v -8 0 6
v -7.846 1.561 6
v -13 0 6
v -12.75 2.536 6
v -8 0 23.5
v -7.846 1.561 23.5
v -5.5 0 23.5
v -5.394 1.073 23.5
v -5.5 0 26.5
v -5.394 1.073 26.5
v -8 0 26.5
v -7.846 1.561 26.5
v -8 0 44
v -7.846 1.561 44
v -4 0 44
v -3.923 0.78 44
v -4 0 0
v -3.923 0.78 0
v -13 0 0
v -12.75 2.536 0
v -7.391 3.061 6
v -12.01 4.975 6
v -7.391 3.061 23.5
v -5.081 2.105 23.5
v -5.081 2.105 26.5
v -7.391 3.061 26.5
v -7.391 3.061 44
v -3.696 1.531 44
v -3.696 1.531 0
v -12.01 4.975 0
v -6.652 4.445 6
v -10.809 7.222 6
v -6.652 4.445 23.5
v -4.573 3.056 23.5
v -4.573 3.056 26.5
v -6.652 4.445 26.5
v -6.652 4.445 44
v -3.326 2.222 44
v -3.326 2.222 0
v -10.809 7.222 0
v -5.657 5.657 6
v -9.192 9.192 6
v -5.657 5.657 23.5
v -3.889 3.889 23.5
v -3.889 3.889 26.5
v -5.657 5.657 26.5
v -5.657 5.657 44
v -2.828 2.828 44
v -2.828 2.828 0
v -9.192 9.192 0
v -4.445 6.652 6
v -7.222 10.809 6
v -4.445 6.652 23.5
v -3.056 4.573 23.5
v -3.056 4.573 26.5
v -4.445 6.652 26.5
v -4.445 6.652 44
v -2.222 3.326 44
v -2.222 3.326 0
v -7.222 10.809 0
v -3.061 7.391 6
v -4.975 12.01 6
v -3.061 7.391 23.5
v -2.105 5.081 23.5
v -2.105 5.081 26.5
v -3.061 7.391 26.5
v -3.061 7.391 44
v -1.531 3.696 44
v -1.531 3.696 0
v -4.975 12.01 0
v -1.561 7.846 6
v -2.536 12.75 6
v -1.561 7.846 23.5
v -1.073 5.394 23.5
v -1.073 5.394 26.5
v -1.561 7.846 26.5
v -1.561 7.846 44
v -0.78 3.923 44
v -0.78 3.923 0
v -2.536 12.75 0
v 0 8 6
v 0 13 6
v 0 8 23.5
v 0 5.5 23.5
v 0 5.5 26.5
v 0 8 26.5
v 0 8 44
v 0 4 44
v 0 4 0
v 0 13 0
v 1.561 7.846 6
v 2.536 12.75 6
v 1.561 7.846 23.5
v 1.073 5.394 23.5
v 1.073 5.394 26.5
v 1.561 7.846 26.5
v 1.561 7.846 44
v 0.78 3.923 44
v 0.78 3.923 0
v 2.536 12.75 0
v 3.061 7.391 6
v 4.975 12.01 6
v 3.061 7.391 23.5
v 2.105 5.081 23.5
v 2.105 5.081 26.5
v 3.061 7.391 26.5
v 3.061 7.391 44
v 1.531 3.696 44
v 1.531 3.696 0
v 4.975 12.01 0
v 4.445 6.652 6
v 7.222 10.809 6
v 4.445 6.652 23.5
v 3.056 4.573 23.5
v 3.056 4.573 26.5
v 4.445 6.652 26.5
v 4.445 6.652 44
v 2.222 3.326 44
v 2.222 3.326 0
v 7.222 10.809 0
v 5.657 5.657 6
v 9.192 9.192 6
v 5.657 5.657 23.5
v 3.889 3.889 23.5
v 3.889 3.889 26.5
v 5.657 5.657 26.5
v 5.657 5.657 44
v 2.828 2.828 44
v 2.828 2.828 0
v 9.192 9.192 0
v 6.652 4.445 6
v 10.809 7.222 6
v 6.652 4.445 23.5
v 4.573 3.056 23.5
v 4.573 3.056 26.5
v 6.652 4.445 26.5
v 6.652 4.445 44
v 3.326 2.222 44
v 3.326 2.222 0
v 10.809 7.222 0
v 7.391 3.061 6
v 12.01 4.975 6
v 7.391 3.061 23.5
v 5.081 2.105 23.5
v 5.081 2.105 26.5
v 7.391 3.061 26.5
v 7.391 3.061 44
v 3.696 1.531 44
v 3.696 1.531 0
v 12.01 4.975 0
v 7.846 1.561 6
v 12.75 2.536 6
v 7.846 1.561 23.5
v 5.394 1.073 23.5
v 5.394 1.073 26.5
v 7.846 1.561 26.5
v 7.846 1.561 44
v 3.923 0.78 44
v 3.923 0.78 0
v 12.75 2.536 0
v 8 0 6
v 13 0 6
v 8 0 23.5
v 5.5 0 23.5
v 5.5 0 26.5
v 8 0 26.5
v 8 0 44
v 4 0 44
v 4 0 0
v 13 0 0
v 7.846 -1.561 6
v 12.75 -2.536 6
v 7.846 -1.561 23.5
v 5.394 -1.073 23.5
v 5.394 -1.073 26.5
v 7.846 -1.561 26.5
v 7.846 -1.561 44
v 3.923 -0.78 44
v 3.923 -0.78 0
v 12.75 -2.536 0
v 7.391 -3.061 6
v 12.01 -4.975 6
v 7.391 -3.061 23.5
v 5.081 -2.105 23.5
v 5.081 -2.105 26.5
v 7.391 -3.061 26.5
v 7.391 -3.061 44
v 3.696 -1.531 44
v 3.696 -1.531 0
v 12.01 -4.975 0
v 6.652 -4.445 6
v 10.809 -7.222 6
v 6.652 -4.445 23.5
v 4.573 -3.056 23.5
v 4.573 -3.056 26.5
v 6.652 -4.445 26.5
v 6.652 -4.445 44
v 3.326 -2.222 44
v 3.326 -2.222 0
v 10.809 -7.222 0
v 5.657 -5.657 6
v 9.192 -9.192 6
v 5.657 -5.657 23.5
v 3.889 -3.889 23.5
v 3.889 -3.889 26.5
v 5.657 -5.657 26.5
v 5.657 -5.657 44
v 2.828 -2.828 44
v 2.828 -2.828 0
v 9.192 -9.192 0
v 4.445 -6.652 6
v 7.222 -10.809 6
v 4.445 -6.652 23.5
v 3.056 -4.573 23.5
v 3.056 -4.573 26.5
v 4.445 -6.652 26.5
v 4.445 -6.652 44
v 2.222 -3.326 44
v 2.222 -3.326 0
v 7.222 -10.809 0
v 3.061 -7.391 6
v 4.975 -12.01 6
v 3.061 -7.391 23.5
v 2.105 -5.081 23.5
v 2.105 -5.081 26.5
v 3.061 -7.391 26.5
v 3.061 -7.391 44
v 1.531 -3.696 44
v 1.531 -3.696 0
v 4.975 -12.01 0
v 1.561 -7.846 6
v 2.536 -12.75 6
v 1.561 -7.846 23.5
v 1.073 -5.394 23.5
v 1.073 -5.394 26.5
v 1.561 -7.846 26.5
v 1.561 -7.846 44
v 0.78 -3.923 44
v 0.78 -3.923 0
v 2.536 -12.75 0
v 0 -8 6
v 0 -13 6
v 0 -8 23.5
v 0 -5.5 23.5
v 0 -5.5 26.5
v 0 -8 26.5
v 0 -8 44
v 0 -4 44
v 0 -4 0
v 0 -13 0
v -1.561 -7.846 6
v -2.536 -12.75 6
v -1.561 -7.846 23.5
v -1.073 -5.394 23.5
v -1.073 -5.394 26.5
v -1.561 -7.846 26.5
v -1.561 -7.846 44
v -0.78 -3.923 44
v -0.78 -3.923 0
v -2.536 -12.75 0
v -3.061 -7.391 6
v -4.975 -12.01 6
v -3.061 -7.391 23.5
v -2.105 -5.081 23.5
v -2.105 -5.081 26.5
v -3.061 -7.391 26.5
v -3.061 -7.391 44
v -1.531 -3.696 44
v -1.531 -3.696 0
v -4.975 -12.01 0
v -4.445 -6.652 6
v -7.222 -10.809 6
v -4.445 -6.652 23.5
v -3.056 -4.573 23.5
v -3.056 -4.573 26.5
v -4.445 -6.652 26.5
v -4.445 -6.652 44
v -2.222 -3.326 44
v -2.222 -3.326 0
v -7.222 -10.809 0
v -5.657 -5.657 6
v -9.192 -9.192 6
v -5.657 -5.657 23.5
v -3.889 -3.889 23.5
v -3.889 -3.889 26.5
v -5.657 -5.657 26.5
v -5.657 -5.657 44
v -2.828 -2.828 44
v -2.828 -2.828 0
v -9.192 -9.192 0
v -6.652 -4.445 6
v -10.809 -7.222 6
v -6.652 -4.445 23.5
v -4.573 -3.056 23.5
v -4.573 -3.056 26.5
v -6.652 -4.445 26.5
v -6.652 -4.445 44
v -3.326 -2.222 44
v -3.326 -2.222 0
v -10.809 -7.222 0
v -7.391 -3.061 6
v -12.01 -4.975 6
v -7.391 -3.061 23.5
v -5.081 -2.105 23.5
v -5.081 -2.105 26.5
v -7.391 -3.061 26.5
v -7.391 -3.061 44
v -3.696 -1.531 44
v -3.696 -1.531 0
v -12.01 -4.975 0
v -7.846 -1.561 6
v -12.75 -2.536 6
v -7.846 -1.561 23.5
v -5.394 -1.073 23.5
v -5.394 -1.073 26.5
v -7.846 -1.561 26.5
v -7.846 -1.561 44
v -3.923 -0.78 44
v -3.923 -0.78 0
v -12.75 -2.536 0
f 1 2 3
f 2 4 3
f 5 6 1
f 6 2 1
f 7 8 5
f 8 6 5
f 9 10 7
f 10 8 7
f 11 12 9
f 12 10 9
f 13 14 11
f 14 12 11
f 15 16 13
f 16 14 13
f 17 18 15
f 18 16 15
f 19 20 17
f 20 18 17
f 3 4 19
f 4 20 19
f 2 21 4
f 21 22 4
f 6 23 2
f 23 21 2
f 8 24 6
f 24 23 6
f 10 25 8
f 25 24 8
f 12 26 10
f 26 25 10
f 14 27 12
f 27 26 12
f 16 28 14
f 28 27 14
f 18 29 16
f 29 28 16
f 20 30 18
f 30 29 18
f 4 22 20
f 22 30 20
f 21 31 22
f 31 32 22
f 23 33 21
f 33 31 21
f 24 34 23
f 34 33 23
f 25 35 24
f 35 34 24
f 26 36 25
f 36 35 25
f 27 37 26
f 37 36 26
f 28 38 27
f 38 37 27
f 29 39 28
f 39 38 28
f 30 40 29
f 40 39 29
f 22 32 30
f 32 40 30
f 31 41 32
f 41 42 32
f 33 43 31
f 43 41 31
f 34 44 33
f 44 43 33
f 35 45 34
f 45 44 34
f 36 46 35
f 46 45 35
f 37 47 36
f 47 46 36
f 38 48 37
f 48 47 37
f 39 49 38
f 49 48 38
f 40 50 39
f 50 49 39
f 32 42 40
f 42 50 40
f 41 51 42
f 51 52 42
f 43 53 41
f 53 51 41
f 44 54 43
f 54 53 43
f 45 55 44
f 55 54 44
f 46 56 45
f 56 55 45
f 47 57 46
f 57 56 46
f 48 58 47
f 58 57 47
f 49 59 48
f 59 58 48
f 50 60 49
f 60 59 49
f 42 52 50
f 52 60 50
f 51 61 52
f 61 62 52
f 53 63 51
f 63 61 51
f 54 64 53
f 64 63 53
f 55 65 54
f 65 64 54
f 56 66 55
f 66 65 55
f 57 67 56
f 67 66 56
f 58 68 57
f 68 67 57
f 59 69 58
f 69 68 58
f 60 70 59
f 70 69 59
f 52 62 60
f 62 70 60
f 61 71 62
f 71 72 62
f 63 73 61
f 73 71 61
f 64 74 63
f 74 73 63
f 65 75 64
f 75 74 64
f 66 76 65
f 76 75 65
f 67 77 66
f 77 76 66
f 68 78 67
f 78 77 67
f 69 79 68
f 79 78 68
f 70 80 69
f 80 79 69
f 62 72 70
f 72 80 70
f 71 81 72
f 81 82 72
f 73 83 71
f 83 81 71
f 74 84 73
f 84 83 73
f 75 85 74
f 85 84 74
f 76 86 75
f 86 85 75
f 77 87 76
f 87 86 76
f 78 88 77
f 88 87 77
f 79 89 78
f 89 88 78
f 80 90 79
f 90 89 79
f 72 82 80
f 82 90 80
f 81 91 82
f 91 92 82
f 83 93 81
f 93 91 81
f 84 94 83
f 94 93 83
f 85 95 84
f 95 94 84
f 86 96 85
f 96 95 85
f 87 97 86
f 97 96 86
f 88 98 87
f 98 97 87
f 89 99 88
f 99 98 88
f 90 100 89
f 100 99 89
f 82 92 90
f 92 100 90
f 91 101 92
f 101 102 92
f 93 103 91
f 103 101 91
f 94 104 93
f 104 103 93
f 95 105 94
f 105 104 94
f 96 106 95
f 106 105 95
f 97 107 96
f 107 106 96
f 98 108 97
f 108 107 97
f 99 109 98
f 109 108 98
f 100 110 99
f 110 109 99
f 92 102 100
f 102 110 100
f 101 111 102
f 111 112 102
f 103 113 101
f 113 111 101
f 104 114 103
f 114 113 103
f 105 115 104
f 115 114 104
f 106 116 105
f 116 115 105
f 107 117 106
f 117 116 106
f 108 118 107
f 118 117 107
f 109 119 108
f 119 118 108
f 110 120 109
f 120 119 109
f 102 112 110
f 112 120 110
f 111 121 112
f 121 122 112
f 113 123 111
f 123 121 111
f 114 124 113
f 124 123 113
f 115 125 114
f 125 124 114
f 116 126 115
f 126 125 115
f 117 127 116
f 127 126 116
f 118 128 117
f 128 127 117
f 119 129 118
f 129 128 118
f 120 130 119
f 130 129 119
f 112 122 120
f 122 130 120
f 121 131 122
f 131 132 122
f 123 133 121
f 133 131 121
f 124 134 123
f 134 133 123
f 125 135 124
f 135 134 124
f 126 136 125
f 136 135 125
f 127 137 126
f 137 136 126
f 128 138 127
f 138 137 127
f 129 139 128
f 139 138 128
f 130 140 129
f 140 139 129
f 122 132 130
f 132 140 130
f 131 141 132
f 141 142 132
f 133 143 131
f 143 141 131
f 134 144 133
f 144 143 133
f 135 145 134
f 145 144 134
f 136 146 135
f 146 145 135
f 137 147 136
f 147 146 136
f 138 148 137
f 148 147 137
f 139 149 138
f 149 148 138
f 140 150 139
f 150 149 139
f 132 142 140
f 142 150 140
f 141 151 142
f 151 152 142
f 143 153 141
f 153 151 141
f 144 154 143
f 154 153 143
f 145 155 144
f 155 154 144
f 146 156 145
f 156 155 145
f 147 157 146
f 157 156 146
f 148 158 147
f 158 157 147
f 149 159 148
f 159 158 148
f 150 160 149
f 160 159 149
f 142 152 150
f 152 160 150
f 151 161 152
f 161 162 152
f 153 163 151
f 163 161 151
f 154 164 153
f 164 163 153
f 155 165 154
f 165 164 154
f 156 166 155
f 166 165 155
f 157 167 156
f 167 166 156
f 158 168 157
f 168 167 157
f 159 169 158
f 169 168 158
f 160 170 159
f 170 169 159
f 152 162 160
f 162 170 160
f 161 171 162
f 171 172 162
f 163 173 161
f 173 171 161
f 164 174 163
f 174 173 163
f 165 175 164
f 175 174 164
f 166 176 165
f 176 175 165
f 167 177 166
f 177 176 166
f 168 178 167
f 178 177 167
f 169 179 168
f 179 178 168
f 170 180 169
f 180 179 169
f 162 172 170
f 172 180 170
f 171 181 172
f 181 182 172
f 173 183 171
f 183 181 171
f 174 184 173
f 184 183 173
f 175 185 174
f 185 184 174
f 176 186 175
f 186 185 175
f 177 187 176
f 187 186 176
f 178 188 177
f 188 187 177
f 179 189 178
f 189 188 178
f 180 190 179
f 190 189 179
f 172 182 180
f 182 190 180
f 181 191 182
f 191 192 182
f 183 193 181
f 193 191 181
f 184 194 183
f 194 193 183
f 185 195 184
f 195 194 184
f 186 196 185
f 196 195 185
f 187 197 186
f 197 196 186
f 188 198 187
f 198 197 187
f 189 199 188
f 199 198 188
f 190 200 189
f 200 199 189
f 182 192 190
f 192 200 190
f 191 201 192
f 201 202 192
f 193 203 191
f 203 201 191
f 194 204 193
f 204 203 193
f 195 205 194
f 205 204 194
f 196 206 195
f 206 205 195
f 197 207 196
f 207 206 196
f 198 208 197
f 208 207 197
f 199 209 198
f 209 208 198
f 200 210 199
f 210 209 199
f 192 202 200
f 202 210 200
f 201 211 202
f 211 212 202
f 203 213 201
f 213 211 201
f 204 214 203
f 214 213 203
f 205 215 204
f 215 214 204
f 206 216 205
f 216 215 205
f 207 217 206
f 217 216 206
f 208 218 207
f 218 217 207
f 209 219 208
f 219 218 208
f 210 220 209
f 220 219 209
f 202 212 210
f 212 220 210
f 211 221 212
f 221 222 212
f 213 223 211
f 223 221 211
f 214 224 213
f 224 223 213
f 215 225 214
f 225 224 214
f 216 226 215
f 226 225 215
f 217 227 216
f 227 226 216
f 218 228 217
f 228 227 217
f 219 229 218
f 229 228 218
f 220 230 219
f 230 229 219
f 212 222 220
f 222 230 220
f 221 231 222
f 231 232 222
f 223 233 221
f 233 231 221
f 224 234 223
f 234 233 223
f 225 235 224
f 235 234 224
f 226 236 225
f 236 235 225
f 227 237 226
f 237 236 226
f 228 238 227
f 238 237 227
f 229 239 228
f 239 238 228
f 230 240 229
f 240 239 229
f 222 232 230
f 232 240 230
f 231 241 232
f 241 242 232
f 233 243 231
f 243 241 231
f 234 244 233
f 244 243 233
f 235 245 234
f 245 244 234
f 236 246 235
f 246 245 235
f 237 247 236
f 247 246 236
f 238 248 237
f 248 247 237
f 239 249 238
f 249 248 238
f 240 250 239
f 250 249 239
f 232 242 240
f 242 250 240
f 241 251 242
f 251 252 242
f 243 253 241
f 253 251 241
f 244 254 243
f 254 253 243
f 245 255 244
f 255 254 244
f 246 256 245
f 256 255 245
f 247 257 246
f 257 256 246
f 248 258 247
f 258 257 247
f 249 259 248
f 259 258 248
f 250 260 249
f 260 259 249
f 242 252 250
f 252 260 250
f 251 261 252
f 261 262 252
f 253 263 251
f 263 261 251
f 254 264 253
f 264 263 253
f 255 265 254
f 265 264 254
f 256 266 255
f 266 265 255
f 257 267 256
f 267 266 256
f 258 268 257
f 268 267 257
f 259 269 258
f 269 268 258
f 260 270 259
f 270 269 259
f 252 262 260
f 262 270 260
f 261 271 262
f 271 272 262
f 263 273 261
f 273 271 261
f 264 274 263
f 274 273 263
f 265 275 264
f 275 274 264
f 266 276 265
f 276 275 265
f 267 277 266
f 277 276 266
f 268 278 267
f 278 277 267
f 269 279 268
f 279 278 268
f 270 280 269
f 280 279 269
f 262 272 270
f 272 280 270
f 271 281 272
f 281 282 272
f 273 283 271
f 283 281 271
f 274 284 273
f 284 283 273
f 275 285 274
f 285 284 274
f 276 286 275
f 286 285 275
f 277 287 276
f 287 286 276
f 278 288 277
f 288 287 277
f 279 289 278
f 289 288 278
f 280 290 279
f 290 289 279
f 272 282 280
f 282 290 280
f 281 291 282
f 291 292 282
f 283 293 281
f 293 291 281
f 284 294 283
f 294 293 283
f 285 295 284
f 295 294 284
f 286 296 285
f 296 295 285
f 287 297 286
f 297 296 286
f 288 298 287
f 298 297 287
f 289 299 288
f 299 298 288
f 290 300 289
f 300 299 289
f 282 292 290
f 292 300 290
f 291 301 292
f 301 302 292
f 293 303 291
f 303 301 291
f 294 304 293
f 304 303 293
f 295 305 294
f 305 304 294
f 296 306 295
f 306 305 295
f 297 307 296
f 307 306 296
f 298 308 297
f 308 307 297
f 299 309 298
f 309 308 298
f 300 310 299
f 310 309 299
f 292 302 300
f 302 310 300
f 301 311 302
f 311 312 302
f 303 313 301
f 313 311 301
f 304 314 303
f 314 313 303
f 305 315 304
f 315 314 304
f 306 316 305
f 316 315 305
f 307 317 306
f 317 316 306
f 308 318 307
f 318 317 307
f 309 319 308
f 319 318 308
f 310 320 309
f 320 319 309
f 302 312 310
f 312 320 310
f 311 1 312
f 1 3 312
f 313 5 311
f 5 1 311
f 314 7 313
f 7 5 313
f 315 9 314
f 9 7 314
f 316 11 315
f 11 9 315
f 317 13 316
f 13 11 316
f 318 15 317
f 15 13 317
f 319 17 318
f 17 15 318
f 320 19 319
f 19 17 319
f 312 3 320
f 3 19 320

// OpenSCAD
$fn = 32;

// ----------------------------------------------------------------------
// Grooved revolve: flanged, bore R4
// ----------------------------------------------------------------------

// --- parameters (mm) ---
bore_r = 4;               // bore radius
outer_r = 8;              // outer radius of the body
total_h = 44;             // overall height, Z
wall = 4;                 // radial wall thickness
groove_w = 3;             // groove width
groove_d = 2.5;           // groove depth
grooves = 1;              // number of outer grooves
flange_r = 13;            // flange radius
flange_h = 6;             // flange height

bbox_x = 2 * flange_r;  // full diameter
bore_d = 2 * bore_r;  // bore diameter
body_d = 2 * outer_r;  // body diameter
flange_d = 2 * flange_r;  // flange diameter
revolve_angle = 360;  // full turn around the Z axis

profile = [[4, 0], [8, 0], [13, 0], [13, 6], [8, 6], [8, 23.5], [5.5, 23.5], [5.5, 26.5], [8, 26.5], [8, 44], [4, 44]];  // primary outline, 11 points, counter clockwise

// --- the one profile operation ---
rotate_extrude(angle = revolve_angle) polygon(points = profile);
